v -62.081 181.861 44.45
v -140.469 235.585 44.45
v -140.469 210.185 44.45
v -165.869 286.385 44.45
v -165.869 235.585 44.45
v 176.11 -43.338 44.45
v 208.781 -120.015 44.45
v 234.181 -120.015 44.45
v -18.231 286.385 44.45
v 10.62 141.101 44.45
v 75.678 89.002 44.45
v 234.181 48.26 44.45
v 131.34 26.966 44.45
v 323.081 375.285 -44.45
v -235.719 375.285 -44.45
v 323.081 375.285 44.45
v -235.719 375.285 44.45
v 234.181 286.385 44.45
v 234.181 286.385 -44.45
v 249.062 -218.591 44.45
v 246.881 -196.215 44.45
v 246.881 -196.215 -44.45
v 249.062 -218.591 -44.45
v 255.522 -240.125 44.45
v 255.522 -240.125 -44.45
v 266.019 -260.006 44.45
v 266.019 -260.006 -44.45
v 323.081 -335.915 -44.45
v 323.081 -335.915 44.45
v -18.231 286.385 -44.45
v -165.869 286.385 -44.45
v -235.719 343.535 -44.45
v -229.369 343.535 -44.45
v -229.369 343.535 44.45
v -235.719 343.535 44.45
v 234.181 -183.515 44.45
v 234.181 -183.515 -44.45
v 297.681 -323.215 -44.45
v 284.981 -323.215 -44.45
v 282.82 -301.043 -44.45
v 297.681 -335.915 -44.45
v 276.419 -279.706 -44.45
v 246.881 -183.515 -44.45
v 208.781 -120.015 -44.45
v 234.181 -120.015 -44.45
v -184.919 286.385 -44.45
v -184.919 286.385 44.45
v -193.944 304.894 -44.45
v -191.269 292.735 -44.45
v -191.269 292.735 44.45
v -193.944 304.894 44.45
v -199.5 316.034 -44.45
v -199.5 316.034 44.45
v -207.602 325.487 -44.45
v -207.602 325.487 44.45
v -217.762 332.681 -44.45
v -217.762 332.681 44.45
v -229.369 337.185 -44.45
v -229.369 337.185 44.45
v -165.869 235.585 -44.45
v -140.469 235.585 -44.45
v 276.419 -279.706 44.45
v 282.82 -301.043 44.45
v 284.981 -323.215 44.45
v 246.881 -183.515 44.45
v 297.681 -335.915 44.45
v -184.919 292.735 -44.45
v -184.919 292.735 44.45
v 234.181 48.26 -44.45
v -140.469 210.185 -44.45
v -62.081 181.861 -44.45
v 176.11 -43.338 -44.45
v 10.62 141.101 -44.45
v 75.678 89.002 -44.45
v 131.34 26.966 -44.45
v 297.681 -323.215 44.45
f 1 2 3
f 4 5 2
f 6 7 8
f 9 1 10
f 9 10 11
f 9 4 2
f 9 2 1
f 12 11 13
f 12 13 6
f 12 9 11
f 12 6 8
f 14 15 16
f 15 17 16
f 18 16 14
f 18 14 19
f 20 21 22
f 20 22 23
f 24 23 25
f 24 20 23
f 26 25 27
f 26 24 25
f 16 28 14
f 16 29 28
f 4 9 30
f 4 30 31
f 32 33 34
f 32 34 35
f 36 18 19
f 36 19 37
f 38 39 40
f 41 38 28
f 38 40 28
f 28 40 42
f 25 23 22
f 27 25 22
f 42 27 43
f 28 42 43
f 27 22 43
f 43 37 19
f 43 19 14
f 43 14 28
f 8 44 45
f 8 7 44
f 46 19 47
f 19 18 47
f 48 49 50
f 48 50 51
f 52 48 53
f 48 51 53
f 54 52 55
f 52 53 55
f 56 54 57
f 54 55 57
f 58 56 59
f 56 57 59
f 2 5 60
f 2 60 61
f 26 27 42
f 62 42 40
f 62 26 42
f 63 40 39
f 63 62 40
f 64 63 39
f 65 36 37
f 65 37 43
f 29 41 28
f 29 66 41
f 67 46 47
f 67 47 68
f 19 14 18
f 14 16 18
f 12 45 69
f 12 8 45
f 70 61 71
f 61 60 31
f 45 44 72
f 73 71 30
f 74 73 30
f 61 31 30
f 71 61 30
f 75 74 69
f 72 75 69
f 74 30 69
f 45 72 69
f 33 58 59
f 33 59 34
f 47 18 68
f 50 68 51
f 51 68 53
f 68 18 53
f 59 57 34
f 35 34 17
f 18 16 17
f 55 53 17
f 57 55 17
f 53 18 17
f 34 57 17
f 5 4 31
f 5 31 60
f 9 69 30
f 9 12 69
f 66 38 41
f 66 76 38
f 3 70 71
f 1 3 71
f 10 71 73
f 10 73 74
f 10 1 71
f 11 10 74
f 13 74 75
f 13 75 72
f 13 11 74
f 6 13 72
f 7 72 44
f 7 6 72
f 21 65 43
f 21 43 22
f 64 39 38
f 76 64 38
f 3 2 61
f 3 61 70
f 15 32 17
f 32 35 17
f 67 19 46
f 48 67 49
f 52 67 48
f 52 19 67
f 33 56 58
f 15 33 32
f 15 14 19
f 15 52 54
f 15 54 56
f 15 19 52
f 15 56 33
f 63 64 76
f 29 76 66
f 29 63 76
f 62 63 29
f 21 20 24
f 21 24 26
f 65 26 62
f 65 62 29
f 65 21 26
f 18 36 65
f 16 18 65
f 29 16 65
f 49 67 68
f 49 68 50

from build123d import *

# Parameters (mm, degrees)
BOSS_EXTRUDE1_DEPTH = 44.45
BOSS_EXTRUDE2_DEPTH = 44.45
BOSS_EXTRUDE3_DEPTH = 44.45


with BuildPart() as part:
    # Sketch1 → Boss-Extrude1 (new body, symmetric)
    with BuildSketch(Plane.XY):
        with BuildLine():
            Line((-229.368776984, 337.185), (-229.368776984, 343.535))
            Line((-229.368776984, 343.535), (-235.718776984, 343.535))
            Line((-235.718776984, 343.535), (-235.718776984, 375.285))
            Line((-235.718776984, 375.285), (323.081223016, 375.285))
            Line((323.081223016, 375.285), (234.181223016, 286.385))
            Line((234.181223016, 286.385), (-184.918776984, 286.385))
            Line((-184.918776984, 286.385), (-184.918776984, 292.735))
            Line((-184.918776984, 292.735), (-191.268776984, 292.735))
            ThreePointArc((-191.268776984, 292.735), (-203.260423906, 321.010016924), (-229.368776984, 337.185))
        make_face()
    extrude(amount=BOSS_EXTRUDE1_DEPTH, both=True)


with BuildPart() as body_2:
    # Sketch1_3 → Boss-Extrude2 (new body, symmetric)
    with BuildSketch(Plane.XY):
        with BuildLine():
            Line((234.181223016, 48.26), (-18.231276984, 286.385))
            Line((-18.231276984, 286.385), (-165.868776984, 286.385))
            Line((-165.868776984, 286.385), (-165.868776984, 235.585))
            Line((-165.868776984, 235.585), (-140.468776984, 235.585))
            Line((-140.468776984, 235.585), (-140.468776984, 210.185))
            ThreePointArc((-140.468776984, 210.185), (75.677544074, 89.001781889), (208.781223016, -120.015))
            Line((208.781223016, -120.015), (234.181223016, -120.015))
            Line((234.181223016, -120.015), (234.181223016, 48.26))
        make_face()
    extrude(amount=BOSS_EXTRUDE2_DEPTH, both=True)


with BuildPart() as body_3:
    # Sketch1_4 → Boss-Extrude3 (new body, symmetric)
    with BuildSketch(Plane.XY):
        with BuildLine():
            Line((323.081223016, -335.915), (323.081223016, 375.285))
            Line((323.081223016, 375.285), (234.181223016, 286.385))
            Line((234.181223016, 286.385), (234.181223016, -183.515))
            Line((234.181223016, -183.515), (246.881223016, -183.515))
            Line((246.881223016, -183.515), (246.881223016, -196.215))
            ThreePointArc((246.881223016, -196.215), (251.768629387, -229.515028089), (266.018608337, -260.006284404))
            ThreePointArc((266.018608337, -260.006284404), (280.138450492, -290.219081757), (284.981223016, -323.215))
            Line((284.981223016, -323.215), (297.681223016, -323.215))
            Line((297.681223016, -323.215), (297.681223016, -335.915))
            Line((297.681223016, -335.915), (323.081223016, -335.915))
        make_face()
    extrude(amount=BOSS_EXTRUDE3_DEPTH, both=True)


solid = Compound([part.part, body_2.part, body_3.part])
